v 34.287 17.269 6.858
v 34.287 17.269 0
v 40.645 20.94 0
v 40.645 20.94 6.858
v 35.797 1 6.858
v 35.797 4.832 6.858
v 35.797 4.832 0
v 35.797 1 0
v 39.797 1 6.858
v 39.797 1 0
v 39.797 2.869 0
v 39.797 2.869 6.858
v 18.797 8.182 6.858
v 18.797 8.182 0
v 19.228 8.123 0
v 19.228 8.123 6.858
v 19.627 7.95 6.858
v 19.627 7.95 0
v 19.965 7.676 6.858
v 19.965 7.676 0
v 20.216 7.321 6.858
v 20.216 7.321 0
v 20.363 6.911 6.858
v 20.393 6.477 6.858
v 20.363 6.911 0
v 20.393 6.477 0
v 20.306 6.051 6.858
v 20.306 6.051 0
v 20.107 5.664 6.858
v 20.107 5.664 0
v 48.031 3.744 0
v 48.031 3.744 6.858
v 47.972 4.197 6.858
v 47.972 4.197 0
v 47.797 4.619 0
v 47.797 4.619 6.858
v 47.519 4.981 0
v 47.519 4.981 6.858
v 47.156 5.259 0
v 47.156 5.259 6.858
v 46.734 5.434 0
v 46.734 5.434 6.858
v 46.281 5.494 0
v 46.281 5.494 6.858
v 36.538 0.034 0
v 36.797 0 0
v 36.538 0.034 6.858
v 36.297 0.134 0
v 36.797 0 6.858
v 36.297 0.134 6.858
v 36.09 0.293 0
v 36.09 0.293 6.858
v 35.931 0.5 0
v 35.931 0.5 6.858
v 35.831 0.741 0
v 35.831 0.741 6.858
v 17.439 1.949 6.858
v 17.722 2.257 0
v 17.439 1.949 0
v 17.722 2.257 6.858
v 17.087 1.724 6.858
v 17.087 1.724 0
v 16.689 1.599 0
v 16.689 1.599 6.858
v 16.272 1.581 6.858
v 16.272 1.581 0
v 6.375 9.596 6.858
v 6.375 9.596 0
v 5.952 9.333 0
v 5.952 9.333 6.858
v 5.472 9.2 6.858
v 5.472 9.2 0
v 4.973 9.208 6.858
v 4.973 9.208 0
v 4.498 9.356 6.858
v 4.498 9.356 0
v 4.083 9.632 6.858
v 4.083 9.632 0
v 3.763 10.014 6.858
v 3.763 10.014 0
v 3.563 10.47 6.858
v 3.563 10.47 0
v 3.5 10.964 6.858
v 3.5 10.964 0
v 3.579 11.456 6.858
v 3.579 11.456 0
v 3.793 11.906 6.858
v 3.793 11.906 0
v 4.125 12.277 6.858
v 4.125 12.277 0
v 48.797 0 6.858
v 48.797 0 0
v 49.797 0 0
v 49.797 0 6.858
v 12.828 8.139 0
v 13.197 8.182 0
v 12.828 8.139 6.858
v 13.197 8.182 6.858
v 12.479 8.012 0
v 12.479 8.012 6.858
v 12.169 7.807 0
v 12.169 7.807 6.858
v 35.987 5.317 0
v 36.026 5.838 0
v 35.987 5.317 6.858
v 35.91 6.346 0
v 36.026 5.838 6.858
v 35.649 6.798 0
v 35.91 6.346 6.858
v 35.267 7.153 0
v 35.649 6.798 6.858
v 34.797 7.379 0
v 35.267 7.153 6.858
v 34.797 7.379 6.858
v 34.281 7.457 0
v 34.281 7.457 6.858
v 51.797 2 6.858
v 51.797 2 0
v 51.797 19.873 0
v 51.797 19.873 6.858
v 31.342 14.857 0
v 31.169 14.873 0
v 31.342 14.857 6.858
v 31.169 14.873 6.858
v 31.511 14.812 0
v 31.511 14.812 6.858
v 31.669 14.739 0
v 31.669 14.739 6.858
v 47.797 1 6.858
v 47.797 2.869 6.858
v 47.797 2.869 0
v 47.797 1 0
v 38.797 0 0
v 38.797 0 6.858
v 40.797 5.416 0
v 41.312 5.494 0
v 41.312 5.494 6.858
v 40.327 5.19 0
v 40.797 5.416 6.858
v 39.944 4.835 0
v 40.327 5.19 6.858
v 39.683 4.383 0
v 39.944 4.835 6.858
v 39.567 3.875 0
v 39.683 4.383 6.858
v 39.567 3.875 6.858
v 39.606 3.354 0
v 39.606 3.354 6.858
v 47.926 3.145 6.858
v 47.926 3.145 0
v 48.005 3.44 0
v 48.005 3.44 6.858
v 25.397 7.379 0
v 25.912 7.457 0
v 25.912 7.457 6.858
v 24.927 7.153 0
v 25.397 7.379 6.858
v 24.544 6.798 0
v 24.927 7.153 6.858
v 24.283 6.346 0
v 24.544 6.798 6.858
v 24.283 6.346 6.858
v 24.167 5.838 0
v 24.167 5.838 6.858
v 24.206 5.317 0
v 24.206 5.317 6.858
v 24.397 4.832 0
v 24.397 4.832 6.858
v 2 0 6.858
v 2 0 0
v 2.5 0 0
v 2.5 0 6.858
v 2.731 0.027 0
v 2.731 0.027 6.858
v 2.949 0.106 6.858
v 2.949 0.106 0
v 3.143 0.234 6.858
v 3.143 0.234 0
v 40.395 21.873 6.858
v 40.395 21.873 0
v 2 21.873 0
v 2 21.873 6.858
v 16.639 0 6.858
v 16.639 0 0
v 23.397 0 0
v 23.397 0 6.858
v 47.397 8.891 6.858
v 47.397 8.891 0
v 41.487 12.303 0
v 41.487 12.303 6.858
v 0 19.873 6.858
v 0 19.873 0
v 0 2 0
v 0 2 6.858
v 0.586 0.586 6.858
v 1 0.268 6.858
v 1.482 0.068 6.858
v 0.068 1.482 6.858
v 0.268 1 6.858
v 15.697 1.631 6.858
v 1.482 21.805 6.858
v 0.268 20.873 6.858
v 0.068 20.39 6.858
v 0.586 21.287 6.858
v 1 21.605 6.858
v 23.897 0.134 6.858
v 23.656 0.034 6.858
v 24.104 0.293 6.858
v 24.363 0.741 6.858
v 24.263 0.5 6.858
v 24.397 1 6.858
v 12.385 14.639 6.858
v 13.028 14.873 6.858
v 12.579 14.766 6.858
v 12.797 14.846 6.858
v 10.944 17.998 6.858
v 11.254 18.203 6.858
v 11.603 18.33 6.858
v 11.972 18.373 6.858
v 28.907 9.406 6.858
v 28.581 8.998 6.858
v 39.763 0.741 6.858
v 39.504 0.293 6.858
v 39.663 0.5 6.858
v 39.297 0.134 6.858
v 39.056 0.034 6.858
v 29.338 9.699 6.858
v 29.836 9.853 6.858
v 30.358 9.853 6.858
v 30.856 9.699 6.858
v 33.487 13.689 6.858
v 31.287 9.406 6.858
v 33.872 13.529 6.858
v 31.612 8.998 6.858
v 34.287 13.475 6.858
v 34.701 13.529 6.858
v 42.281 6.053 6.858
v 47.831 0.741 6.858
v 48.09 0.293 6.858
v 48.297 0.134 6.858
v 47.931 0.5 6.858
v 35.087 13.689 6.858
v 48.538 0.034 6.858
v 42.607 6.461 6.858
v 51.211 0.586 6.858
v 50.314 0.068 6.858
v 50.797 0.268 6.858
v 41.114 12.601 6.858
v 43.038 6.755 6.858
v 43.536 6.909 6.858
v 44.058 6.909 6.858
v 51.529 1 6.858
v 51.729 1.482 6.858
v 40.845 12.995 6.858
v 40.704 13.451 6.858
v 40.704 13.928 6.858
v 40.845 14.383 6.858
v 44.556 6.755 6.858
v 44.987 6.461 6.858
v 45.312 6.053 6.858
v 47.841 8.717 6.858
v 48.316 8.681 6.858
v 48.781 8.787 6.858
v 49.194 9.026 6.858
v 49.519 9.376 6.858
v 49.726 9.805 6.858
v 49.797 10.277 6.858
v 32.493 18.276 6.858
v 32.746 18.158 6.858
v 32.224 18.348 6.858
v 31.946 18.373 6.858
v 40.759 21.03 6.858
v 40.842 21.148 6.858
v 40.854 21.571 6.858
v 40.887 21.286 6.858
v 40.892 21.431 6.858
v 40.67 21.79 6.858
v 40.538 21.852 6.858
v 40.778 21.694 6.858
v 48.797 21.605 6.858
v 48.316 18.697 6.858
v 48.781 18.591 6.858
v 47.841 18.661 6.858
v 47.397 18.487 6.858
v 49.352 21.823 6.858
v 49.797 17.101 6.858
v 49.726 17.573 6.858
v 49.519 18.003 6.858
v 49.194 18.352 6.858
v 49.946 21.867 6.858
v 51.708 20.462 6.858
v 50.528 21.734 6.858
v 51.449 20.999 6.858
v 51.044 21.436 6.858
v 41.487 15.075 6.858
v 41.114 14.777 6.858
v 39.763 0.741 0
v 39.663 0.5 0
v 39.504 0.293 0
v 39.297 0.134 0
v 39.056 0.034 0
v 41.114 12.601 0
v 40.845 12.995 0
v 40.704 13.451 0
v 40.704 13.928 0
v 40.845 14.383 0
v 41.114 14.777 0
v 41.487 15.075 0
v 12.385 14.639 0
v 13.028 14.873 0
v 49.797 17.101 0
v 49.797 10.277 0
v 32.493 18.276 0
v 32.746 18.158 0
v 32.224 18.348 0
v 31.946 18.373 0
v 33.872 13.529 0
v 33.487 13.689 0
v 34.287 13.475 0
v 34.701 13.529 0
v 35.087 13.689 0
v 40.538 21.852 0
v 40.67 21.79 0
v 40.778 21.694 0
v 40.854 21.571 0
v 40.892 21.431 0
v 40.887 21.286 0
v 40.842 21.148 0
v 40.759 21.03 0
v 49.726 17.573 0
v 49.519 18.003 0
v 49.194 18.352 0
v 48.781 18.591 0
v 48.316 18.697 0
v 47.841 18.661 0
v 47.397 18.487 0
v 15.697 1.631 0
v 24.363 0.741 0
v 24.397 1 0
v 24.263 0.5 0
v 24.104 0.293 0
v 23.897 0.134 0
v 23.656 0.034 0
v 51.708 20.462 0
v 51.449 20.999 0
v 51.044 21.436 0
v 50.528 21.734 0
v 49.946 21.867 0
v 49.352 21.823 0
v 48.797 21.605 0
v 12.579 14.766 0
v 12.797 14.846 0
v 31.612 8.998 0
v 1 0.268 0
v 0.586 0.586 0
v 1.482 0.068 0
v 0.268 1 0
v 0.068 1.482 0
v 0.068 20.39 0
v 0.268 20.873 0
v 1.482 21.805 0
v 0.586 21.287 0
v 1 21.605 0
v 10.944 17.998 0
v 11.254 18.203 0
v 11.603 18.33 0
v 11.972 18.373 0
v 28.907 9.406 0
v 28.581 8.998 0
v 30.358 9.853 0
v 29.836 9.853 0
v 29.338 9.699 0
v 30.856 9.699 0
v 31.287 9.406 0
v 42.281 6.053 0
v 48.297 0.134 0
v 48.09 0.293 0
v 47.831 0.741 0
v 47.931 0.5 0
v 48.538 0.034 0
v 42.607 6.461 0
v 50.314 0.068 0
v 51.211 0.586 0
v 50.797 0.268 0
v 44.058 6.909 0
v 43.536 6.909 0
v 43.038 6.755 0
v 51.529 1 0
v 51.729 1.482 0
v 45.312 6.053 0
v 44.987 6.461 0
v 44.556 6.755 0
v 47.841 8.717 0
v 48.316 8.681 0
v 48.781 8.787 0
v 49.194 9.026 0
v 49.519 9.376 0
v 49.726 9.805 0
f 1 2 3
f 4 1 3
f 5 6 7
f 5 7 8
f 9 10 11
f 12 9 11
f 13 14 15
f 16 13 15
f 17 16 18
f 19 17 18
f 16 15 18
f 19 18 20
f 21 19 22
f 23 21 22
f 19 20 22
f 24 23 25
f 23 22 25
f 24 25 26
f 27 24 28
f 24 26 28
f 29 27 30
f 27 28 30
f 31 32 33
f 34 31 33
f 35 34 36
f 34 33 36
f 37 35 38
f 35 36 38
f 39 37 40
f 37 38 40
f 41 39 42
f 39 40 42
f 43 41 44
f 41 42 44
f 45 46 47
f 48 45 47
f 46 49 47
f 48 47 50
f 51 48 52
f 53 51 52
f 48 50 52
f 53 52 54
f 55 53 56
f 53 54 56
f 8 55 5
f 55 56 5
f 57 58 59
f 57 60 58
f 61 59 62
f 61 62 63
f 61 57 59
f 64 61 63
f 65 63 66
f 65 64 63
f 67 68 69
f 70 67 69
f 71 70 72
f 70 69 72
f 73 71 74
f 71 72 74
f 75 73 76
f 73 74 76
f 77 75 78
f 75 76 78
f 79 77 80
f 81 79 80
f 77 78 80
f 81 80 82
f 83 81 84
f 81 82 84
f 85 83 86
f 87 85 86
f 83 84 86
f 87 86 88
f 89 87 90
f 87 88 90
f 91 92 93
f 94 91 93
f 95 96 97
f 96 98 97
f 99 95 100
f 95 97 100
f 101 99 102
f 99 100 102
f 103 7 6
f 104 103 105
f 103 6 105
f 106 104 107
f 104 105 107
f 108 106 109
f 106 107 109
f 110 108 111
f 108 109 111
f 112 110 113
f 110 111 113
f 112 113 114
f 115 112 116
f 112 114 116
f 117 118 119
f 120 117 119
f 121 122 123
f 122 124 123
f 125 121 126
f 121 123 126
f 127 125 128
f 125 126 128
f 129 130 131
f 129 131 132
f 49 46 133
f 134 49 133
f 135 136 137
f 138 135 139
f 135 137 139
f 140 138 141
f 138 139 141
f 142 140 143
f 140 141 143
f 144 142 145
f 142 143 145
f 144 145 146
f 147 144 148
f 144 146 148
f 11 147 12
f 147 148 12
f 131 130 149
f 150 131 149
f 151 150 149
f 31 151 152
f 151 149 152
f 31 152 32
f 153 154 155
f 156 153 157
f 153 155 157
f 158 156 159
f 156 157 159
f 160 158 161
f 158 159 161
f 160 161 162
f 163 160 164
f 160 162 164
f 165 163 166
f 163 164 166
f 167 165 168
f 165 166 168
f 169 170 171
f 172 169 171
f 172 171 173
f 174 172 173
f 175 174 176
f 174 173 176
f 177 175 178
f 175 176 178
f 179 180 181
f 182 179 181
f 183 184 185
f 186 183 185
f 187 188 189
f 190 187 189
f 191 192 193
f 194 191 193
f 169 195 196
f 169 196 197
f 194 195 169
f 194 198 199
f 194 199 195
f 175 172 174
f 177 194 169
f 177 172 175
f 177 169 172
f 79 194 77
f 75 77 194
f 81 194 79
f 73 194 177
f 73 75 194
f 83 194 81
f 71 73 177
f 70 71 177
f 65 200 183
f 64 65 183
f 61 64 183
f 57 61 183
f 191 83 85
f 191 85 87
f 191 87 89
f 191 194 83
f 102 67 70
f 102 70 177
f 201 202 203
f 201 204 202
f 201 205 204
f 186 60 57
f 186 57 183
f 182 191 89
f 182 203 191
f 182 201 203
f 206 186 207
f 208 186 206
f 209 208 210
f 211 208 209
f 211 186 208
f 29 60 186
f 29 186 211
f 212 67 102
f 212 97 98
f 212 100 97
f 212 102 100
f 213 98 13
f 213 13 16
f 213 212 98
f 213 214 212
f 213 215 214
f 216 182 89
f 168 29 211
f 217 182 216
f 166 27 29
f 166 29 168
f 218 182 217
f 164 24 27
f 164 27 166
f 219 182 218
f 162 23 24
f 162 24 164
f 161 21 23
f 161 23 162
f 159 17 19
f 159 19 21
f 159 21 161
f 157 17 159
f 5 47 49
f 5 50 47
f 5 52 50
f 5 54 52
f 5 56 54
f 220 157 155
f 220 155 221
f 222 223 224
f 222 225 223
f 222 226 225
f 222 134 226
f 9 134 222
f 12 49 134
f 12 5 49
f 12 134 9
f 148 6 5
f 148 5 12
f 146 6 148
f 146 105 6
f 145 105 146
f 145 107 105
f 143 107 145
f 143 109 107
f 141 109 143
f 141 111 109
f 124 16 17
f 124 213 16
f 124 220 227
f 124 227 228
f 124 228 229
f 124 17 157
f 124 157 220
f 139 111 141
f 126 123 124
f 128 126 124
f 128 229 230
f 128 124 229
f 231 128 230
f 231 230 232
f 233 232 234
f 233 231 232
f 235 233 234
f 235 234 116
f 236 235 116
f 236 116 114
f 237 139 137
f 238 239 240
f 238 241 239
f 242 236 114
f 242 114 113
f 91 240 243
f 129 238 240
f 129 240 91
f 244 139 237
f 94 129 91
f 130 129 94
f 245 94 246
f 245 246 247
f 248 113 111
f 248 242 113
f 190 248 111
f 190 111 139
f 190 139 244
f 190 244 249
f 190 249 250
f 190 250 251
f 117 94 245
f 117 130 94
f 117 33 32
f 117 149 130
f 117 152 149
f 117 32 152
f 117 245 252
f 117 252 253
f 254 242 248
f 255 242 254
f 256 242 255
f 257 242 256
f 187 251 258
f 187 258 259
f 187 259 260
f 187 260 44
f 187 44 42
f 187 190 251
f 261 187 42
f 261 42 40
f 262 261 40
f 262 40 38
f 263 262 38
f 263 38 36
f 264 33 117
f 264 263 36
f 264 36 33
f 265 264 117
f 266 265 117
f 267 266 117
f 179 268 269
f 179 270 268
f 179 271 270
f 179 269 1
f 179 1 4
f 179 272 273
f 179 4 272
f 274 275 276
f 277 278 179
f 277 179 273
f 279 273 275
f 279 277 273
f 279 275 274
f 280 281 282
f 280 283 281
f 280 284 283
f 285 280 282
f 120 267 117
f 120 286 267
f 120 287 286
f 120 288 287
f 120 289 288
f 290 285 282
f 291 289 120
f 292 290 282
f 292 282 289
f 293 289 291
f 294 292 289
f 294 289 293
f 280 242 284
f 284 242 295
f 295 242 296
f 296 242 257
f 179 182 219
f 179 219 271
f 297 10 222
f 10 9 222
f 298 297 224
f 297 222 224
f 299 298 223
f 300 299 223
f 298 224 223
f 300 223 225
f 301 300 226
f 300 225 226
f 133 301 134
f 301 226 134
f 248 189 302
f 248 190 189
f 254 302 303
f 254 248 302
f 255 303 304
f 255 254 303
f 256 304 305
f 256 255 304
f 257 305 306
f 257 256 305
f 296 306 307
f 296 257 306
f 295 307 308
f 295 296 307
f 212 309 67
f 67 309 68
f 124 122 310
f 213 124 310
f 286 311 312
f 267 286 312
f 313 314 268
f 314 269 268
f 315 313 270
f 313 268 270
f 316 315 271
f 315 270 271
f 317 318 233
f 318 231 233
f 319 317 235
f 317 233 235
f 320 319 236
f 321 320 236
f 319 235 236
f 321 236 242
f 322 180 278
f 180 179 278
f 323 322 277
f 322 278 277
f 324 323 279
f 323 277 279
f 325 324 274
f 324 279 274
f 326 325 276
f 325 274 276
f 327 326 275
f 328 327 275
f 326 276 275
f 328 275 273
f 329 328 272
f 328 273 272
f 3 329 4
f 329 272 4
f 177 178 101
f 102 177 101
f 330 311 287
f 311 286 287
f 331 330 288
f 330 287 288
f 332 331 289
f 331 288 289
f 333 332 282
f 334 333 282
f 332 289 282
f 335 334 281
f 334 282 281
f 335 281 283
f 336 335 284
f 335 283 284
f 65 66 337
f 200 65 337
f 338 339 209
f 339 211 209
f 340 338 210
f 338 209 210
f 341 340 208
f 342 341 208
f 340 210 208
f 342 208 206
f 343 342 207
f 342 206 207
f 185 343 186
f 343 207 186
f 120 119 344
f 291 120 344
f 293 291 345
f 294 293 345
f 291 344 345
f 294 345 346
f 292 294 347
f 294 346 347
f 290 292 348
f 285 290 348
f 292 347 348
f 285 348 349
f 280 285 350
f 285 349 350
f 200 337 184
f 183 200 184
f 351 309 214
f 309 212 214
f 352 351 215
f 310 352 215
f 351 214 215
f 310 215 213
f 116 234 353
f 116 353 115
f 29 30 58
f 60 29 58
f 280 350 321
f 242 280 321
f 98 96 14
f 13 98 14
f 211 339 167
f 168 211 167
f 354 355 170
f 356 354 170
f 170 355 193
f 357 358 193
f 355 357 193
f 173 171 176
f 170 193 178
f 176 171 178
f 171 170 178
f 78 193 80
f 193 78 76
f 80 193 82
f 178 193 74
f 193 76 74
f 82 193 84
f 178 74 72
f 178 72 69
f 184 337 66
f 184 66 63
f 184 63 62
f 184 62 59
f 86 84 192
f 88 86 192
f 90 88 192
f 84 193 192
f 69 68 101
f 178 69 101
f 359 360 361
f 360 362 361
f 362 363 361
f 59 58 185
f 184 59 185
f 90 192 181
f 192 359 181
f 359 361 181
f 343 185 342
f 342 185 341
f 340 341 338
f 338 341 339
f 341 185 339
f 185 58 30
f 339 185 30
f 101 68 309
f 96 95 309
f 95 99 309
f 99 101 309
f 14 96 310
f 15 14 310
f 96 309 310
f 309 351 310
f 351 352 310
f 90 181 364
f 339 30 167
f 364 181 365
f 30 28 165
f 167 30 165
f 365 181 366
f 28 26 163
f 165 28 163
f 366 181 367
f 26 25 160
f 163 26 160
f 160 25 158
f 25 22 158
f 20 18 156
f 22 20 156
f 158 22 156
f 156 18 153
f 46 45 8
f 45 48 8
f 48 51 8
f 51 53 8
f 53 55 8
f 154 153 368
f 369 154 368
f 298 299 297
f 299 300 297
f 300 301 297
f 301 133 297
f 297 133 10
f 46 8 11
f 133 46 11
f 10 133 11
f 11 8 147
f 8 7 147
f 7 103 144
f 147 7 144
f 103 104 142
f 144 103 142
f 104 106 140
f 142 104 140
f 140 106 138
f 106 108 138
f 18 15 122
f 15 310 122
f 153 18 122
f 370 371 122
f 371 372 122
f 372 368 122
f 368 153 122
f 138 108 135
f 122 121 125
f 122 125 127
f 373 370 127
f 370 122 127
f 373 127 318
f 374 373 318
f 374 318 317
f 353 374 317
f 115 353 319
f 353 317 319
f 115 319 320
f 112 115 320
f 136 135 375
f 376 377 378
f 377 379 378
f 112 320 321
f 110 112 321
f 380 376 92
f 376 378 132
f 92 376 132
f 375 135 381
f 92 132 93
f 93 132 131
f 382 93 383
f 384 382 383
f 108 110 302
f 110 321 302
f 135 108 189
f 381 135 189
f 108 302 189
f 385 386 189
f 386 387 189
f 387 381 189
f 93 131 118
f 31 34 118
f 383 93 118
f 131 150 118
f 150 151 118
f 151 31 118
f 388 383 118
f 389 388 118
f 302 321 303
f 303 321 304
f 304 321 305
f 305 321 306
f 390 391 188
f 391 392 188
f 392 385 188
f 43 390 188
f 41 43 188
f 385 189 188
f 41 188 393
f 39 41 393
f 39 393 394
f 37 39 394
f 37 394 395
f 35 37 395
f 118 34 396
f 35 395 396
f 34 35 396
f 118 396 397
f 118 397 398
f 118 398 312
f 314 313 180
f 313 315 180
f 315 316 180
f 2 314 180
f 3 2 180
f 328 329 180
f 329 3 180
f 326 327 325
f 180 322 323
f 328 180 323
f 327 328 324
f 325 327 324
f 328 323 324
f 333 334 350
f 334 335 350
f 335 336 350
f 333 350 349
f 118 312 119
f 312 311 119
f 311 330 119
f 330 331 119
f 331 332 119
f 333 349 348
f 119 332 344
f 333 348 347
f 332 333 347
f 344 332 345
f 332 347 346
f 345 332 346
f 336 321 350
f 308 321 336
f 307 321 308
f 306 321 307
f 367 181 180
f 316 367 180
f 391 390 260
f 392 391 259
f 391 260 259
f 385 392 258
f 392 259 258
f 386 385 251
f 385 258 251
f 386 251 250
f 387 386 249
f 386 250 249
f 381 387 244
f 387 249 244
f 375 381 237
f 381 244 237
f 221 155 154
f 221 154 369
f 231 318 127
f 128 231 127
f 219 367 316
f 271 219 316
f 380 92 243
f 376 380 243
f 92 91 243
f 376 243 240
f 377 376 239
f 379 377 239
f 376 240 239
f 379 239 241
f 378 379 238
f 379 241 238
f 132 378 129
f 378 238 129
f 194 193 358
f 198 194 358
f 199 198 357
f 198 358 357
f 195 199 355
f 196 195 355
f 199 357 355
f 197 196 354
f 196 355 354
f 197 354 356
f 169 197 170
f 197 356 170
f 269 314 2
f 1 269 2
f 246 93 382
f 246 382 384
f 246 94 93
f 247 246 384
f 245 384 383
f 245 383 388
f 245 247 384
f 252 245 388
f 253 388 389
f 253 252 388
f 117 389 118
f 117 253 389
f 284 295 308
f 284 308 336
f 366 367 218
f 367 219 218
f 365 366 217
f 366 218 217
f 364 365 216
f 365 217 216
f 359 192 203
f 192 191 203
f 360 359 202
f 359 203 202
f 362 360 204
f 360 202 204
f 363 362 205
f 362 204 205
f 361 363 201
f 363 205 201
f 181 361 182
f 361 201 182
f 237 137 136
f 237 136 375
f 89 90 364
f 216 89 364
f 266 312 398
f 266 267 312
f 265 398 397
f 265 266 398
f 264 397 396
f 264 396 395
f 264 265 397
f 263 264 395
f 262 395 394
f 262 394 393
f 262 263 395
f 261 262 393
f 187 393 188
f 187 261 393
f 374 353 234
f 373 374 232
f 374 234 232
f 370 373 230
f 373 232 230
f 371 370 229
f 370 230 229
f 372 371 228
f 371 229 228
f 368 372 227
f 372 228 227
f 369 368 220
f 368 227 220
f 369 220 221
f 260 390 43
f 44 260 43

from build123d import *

# Parameters (mm, degrees)
F1_DEPTH = 6.858
F2_R     = 1.75
F3_DEPTH = 6.859
F4_R     = 1
F5_R     = 2
F6_R     = 0.5
F7_R     = 1
F8_R     = 1.6
F9_R     = 1.6
F10_R    = 1.6


with BuildPart() as f1:
    # F0 (on Top) → F1 (new body)
    with BuildSketch(Plane.XY):
        with BuildLine():
            ThreePointArc((0, 2), (0.585786, 0.585786), (2, 0))
            Line((2, 0), (2.5, 0))
            ThreePointArc((2.5, 0), (2.84202, 0.060307), (3.142788, 0.233956))
            Line((3.142788, 0.233956), (12.614652, 8.181793))
            Line((12.614652, 8.181793), (18.796832, 8.181793))
            ThreePointArc((18.796832, 8.181793), (20.21605, 7.320591), (20.107475, 5.664071))
            Line((20.107475, 5.664071), (17.191762, 1.5))
            Line((17.191762, 1.5), (15.69747, 1.630734))
            Line((15.69747, 1.630734), (16.638974, 0))
            Line((16.638974, 0), (24.396832, 0))
            Line((24.396832, 0), (24.396832, 6.581793))
            Line((24.396832, 6.581793), (30.096832, 9.87269))
            Line((30.096832, 9.87269), (35.796832, 6.581793))
            Line((35.796832, 6.581793), (35.796832, 0))
            Line((35.796832, 0), (39.796832, 0))
            Line((39.796832, 0), (39.796832, 4.618802))
            Line((39.796832, 4.618802), (43.796832, 6.928203))
            Line((43.796832, 6.928203), (47.796832, 4.618802))
            Line((47.796832, 4.618802), (47.796832, 0))
            Line((47.796832, 0), (51.796832, 0))
            Line((51.796832, 0), (51.796832, 19.87269))
            ThreePointArc((51.796832, 19.87269), (50.796832, 21.60474), (48.796832, 21.60474))
            Line((48.796832, 21.60474), (34.286578, 13.227241))
            Line((34.286578, 13.227241), (31.436578, 14.87269))
            Line((31.436578, 14.87269), (30.096832, 14.87269))
            Line((30.096832, 14.87269), (12.66367, 14.87269))
            Line((12.66367, 14.87269), (6.374878, 9.595767))
            ThreePointArc((6.374878, 9.595767), (3.909422, 9.811466), (4.125122, 12.276923))
            Line((4.125122, 12.276923), (11.389774, 18.37269))
            Line((11.389774, 18.37269), (32.3744, 18.37269))
            Line((32.3744, 18.37269), (34.286578, 17.268693))
            Line((34.286578, 17.268693), (42.260934, 21.87269))
            Line((42.260934, 21.87269), (0, 21.87269))
            Line((0, 21.87269), (0, 2))
        make_face()
        Polygon((49.796832, 7.505553), (39.086578, 13.689122), (49.796832, 19.87269), align=None, mode=Mode.SUBTRACT)
    extrude(amount=F1_DEPTH)

    # F2 (on face) → F3 (cut, through all)
    with BuildSketch(Plane.XY.offset(6.858)):
        with Locations((30.096832, 8.12269)):
            Circle(F2_R)
        with Locations((34.281288, 5.706793)):
            Circle(F2_R)
        with Locations((25.912377, 5.706793)):
            Circle(F2_R)
        with BuildLine():
            ThreePointArc((45.540307, 5.329188), (45.5452, 5.253766), (45.546832, 5.178203))
            ThreePointArc((45.546832, 5.178203), (45.273182, 4.23858), (44.537813, 3.592818))
            ThreePointArc((44.537813, 3.592818), (46.35685, 1.995434), (48.031288, 3.743802))
            ThreePointArc((48.031288, 3.743802), (47.220911, 5.220152), (45.540307, 5.329188))
        make_face()
        with BuildLine():
            ThreePointArc((44.537813, 3.592818), (44.765743, 4.618802), (45.540307, 5.329188))
            ThreePointArc((45.540307, 5.329188), (43.796832, 6.928203), (42.053358, 5.329188))
            ThreePointArc((42.053358, 5.329188), (42.788726, 4.683425), (43.062377, 3.743802))
            ThreePointArc((43.062377, 3.743802), (43.060745, 3.668239), (43.055851, 3.592818))
            ThreePointArc((43.055851, 3.592818), (43.796832, 3.428203), (44.537813, 3.592818))
        make_face()
        with BuildLine():
            ThreePointArc((43.055851, 3.592818), (42.281288, 4.303203), (42.053358, 5.329188))
            ThreePointArc((42.053358, 5.329188), (39.796832, 2.868802), (43.055851, 3.592818))
        make_face()
    extrude(amount=-F3_DEPTH, mode=Mode.SUBTRACT)

    # F4
    f4_edges = [f1.edges().sort_by_distance(p)[0] for p in [
        (24.396832, 0, 3.429),
        (35.796832, 0, 3.429),
        (39.796832, 0, 3.429),
        (47.796832, 0, 3.429),
    ]]
    fillet(f4_edges, radius=F4_R)

    # F5
    f5_edges = [f1.edges().sort_by_distance(p)[0] for p in [
        (51.796832, 0, 3.429),
        (0, 21.87269, 3.429),
    ]]
    fillet(f5_edges, radius=F5_R)

    # F6
    f6_edges = [f1.edges().sort_by_distance(p)[0] for p in [
        (42.260934, 21.87269, 3.429),
    ]]
    fillet(f6_edges, radius=F6_R)

    # F7
    f7_edges = [f1.edges().sort_by_distance(p)[0] for p in [
        (12.66367, 14.87269, 3.429),
        (31.436578, 14.87269, 3.429),
    ]]
    fillet(f7_edges, radius=F7_R)

    # F8
    f8_edges = [f1.edges().sort_by_distance(p)[0] for p in [
        (39.086578, 13.689122, 3.429),
        (49.796832, 19.87269, 3.429),
        (49.796832, 7.505553, 3.429),
    ]]
    fillet(f8_edges, radius=F8_R)

    # F9
    f9_edges = [f1.edges().sort_by_distance(p)[0] for p in [
        (17.191762, 1.5, 3.429),
    ]]
    fillet(f9_edges, radius=F9_R)

    # F10
    f10_edges = [f1.edges().sort_by_distance(p)[0] for p in [
        (34.286578, 13.227241, 3.429),
        (32.3744, 18.37269, 3.429),
        (11.389774, 18.37269, 3.429),
        (12.614652, 8.181793, 3.429),
    ]]
    fillet(f10_edges, radius=F10_R)


solid = f1.part
